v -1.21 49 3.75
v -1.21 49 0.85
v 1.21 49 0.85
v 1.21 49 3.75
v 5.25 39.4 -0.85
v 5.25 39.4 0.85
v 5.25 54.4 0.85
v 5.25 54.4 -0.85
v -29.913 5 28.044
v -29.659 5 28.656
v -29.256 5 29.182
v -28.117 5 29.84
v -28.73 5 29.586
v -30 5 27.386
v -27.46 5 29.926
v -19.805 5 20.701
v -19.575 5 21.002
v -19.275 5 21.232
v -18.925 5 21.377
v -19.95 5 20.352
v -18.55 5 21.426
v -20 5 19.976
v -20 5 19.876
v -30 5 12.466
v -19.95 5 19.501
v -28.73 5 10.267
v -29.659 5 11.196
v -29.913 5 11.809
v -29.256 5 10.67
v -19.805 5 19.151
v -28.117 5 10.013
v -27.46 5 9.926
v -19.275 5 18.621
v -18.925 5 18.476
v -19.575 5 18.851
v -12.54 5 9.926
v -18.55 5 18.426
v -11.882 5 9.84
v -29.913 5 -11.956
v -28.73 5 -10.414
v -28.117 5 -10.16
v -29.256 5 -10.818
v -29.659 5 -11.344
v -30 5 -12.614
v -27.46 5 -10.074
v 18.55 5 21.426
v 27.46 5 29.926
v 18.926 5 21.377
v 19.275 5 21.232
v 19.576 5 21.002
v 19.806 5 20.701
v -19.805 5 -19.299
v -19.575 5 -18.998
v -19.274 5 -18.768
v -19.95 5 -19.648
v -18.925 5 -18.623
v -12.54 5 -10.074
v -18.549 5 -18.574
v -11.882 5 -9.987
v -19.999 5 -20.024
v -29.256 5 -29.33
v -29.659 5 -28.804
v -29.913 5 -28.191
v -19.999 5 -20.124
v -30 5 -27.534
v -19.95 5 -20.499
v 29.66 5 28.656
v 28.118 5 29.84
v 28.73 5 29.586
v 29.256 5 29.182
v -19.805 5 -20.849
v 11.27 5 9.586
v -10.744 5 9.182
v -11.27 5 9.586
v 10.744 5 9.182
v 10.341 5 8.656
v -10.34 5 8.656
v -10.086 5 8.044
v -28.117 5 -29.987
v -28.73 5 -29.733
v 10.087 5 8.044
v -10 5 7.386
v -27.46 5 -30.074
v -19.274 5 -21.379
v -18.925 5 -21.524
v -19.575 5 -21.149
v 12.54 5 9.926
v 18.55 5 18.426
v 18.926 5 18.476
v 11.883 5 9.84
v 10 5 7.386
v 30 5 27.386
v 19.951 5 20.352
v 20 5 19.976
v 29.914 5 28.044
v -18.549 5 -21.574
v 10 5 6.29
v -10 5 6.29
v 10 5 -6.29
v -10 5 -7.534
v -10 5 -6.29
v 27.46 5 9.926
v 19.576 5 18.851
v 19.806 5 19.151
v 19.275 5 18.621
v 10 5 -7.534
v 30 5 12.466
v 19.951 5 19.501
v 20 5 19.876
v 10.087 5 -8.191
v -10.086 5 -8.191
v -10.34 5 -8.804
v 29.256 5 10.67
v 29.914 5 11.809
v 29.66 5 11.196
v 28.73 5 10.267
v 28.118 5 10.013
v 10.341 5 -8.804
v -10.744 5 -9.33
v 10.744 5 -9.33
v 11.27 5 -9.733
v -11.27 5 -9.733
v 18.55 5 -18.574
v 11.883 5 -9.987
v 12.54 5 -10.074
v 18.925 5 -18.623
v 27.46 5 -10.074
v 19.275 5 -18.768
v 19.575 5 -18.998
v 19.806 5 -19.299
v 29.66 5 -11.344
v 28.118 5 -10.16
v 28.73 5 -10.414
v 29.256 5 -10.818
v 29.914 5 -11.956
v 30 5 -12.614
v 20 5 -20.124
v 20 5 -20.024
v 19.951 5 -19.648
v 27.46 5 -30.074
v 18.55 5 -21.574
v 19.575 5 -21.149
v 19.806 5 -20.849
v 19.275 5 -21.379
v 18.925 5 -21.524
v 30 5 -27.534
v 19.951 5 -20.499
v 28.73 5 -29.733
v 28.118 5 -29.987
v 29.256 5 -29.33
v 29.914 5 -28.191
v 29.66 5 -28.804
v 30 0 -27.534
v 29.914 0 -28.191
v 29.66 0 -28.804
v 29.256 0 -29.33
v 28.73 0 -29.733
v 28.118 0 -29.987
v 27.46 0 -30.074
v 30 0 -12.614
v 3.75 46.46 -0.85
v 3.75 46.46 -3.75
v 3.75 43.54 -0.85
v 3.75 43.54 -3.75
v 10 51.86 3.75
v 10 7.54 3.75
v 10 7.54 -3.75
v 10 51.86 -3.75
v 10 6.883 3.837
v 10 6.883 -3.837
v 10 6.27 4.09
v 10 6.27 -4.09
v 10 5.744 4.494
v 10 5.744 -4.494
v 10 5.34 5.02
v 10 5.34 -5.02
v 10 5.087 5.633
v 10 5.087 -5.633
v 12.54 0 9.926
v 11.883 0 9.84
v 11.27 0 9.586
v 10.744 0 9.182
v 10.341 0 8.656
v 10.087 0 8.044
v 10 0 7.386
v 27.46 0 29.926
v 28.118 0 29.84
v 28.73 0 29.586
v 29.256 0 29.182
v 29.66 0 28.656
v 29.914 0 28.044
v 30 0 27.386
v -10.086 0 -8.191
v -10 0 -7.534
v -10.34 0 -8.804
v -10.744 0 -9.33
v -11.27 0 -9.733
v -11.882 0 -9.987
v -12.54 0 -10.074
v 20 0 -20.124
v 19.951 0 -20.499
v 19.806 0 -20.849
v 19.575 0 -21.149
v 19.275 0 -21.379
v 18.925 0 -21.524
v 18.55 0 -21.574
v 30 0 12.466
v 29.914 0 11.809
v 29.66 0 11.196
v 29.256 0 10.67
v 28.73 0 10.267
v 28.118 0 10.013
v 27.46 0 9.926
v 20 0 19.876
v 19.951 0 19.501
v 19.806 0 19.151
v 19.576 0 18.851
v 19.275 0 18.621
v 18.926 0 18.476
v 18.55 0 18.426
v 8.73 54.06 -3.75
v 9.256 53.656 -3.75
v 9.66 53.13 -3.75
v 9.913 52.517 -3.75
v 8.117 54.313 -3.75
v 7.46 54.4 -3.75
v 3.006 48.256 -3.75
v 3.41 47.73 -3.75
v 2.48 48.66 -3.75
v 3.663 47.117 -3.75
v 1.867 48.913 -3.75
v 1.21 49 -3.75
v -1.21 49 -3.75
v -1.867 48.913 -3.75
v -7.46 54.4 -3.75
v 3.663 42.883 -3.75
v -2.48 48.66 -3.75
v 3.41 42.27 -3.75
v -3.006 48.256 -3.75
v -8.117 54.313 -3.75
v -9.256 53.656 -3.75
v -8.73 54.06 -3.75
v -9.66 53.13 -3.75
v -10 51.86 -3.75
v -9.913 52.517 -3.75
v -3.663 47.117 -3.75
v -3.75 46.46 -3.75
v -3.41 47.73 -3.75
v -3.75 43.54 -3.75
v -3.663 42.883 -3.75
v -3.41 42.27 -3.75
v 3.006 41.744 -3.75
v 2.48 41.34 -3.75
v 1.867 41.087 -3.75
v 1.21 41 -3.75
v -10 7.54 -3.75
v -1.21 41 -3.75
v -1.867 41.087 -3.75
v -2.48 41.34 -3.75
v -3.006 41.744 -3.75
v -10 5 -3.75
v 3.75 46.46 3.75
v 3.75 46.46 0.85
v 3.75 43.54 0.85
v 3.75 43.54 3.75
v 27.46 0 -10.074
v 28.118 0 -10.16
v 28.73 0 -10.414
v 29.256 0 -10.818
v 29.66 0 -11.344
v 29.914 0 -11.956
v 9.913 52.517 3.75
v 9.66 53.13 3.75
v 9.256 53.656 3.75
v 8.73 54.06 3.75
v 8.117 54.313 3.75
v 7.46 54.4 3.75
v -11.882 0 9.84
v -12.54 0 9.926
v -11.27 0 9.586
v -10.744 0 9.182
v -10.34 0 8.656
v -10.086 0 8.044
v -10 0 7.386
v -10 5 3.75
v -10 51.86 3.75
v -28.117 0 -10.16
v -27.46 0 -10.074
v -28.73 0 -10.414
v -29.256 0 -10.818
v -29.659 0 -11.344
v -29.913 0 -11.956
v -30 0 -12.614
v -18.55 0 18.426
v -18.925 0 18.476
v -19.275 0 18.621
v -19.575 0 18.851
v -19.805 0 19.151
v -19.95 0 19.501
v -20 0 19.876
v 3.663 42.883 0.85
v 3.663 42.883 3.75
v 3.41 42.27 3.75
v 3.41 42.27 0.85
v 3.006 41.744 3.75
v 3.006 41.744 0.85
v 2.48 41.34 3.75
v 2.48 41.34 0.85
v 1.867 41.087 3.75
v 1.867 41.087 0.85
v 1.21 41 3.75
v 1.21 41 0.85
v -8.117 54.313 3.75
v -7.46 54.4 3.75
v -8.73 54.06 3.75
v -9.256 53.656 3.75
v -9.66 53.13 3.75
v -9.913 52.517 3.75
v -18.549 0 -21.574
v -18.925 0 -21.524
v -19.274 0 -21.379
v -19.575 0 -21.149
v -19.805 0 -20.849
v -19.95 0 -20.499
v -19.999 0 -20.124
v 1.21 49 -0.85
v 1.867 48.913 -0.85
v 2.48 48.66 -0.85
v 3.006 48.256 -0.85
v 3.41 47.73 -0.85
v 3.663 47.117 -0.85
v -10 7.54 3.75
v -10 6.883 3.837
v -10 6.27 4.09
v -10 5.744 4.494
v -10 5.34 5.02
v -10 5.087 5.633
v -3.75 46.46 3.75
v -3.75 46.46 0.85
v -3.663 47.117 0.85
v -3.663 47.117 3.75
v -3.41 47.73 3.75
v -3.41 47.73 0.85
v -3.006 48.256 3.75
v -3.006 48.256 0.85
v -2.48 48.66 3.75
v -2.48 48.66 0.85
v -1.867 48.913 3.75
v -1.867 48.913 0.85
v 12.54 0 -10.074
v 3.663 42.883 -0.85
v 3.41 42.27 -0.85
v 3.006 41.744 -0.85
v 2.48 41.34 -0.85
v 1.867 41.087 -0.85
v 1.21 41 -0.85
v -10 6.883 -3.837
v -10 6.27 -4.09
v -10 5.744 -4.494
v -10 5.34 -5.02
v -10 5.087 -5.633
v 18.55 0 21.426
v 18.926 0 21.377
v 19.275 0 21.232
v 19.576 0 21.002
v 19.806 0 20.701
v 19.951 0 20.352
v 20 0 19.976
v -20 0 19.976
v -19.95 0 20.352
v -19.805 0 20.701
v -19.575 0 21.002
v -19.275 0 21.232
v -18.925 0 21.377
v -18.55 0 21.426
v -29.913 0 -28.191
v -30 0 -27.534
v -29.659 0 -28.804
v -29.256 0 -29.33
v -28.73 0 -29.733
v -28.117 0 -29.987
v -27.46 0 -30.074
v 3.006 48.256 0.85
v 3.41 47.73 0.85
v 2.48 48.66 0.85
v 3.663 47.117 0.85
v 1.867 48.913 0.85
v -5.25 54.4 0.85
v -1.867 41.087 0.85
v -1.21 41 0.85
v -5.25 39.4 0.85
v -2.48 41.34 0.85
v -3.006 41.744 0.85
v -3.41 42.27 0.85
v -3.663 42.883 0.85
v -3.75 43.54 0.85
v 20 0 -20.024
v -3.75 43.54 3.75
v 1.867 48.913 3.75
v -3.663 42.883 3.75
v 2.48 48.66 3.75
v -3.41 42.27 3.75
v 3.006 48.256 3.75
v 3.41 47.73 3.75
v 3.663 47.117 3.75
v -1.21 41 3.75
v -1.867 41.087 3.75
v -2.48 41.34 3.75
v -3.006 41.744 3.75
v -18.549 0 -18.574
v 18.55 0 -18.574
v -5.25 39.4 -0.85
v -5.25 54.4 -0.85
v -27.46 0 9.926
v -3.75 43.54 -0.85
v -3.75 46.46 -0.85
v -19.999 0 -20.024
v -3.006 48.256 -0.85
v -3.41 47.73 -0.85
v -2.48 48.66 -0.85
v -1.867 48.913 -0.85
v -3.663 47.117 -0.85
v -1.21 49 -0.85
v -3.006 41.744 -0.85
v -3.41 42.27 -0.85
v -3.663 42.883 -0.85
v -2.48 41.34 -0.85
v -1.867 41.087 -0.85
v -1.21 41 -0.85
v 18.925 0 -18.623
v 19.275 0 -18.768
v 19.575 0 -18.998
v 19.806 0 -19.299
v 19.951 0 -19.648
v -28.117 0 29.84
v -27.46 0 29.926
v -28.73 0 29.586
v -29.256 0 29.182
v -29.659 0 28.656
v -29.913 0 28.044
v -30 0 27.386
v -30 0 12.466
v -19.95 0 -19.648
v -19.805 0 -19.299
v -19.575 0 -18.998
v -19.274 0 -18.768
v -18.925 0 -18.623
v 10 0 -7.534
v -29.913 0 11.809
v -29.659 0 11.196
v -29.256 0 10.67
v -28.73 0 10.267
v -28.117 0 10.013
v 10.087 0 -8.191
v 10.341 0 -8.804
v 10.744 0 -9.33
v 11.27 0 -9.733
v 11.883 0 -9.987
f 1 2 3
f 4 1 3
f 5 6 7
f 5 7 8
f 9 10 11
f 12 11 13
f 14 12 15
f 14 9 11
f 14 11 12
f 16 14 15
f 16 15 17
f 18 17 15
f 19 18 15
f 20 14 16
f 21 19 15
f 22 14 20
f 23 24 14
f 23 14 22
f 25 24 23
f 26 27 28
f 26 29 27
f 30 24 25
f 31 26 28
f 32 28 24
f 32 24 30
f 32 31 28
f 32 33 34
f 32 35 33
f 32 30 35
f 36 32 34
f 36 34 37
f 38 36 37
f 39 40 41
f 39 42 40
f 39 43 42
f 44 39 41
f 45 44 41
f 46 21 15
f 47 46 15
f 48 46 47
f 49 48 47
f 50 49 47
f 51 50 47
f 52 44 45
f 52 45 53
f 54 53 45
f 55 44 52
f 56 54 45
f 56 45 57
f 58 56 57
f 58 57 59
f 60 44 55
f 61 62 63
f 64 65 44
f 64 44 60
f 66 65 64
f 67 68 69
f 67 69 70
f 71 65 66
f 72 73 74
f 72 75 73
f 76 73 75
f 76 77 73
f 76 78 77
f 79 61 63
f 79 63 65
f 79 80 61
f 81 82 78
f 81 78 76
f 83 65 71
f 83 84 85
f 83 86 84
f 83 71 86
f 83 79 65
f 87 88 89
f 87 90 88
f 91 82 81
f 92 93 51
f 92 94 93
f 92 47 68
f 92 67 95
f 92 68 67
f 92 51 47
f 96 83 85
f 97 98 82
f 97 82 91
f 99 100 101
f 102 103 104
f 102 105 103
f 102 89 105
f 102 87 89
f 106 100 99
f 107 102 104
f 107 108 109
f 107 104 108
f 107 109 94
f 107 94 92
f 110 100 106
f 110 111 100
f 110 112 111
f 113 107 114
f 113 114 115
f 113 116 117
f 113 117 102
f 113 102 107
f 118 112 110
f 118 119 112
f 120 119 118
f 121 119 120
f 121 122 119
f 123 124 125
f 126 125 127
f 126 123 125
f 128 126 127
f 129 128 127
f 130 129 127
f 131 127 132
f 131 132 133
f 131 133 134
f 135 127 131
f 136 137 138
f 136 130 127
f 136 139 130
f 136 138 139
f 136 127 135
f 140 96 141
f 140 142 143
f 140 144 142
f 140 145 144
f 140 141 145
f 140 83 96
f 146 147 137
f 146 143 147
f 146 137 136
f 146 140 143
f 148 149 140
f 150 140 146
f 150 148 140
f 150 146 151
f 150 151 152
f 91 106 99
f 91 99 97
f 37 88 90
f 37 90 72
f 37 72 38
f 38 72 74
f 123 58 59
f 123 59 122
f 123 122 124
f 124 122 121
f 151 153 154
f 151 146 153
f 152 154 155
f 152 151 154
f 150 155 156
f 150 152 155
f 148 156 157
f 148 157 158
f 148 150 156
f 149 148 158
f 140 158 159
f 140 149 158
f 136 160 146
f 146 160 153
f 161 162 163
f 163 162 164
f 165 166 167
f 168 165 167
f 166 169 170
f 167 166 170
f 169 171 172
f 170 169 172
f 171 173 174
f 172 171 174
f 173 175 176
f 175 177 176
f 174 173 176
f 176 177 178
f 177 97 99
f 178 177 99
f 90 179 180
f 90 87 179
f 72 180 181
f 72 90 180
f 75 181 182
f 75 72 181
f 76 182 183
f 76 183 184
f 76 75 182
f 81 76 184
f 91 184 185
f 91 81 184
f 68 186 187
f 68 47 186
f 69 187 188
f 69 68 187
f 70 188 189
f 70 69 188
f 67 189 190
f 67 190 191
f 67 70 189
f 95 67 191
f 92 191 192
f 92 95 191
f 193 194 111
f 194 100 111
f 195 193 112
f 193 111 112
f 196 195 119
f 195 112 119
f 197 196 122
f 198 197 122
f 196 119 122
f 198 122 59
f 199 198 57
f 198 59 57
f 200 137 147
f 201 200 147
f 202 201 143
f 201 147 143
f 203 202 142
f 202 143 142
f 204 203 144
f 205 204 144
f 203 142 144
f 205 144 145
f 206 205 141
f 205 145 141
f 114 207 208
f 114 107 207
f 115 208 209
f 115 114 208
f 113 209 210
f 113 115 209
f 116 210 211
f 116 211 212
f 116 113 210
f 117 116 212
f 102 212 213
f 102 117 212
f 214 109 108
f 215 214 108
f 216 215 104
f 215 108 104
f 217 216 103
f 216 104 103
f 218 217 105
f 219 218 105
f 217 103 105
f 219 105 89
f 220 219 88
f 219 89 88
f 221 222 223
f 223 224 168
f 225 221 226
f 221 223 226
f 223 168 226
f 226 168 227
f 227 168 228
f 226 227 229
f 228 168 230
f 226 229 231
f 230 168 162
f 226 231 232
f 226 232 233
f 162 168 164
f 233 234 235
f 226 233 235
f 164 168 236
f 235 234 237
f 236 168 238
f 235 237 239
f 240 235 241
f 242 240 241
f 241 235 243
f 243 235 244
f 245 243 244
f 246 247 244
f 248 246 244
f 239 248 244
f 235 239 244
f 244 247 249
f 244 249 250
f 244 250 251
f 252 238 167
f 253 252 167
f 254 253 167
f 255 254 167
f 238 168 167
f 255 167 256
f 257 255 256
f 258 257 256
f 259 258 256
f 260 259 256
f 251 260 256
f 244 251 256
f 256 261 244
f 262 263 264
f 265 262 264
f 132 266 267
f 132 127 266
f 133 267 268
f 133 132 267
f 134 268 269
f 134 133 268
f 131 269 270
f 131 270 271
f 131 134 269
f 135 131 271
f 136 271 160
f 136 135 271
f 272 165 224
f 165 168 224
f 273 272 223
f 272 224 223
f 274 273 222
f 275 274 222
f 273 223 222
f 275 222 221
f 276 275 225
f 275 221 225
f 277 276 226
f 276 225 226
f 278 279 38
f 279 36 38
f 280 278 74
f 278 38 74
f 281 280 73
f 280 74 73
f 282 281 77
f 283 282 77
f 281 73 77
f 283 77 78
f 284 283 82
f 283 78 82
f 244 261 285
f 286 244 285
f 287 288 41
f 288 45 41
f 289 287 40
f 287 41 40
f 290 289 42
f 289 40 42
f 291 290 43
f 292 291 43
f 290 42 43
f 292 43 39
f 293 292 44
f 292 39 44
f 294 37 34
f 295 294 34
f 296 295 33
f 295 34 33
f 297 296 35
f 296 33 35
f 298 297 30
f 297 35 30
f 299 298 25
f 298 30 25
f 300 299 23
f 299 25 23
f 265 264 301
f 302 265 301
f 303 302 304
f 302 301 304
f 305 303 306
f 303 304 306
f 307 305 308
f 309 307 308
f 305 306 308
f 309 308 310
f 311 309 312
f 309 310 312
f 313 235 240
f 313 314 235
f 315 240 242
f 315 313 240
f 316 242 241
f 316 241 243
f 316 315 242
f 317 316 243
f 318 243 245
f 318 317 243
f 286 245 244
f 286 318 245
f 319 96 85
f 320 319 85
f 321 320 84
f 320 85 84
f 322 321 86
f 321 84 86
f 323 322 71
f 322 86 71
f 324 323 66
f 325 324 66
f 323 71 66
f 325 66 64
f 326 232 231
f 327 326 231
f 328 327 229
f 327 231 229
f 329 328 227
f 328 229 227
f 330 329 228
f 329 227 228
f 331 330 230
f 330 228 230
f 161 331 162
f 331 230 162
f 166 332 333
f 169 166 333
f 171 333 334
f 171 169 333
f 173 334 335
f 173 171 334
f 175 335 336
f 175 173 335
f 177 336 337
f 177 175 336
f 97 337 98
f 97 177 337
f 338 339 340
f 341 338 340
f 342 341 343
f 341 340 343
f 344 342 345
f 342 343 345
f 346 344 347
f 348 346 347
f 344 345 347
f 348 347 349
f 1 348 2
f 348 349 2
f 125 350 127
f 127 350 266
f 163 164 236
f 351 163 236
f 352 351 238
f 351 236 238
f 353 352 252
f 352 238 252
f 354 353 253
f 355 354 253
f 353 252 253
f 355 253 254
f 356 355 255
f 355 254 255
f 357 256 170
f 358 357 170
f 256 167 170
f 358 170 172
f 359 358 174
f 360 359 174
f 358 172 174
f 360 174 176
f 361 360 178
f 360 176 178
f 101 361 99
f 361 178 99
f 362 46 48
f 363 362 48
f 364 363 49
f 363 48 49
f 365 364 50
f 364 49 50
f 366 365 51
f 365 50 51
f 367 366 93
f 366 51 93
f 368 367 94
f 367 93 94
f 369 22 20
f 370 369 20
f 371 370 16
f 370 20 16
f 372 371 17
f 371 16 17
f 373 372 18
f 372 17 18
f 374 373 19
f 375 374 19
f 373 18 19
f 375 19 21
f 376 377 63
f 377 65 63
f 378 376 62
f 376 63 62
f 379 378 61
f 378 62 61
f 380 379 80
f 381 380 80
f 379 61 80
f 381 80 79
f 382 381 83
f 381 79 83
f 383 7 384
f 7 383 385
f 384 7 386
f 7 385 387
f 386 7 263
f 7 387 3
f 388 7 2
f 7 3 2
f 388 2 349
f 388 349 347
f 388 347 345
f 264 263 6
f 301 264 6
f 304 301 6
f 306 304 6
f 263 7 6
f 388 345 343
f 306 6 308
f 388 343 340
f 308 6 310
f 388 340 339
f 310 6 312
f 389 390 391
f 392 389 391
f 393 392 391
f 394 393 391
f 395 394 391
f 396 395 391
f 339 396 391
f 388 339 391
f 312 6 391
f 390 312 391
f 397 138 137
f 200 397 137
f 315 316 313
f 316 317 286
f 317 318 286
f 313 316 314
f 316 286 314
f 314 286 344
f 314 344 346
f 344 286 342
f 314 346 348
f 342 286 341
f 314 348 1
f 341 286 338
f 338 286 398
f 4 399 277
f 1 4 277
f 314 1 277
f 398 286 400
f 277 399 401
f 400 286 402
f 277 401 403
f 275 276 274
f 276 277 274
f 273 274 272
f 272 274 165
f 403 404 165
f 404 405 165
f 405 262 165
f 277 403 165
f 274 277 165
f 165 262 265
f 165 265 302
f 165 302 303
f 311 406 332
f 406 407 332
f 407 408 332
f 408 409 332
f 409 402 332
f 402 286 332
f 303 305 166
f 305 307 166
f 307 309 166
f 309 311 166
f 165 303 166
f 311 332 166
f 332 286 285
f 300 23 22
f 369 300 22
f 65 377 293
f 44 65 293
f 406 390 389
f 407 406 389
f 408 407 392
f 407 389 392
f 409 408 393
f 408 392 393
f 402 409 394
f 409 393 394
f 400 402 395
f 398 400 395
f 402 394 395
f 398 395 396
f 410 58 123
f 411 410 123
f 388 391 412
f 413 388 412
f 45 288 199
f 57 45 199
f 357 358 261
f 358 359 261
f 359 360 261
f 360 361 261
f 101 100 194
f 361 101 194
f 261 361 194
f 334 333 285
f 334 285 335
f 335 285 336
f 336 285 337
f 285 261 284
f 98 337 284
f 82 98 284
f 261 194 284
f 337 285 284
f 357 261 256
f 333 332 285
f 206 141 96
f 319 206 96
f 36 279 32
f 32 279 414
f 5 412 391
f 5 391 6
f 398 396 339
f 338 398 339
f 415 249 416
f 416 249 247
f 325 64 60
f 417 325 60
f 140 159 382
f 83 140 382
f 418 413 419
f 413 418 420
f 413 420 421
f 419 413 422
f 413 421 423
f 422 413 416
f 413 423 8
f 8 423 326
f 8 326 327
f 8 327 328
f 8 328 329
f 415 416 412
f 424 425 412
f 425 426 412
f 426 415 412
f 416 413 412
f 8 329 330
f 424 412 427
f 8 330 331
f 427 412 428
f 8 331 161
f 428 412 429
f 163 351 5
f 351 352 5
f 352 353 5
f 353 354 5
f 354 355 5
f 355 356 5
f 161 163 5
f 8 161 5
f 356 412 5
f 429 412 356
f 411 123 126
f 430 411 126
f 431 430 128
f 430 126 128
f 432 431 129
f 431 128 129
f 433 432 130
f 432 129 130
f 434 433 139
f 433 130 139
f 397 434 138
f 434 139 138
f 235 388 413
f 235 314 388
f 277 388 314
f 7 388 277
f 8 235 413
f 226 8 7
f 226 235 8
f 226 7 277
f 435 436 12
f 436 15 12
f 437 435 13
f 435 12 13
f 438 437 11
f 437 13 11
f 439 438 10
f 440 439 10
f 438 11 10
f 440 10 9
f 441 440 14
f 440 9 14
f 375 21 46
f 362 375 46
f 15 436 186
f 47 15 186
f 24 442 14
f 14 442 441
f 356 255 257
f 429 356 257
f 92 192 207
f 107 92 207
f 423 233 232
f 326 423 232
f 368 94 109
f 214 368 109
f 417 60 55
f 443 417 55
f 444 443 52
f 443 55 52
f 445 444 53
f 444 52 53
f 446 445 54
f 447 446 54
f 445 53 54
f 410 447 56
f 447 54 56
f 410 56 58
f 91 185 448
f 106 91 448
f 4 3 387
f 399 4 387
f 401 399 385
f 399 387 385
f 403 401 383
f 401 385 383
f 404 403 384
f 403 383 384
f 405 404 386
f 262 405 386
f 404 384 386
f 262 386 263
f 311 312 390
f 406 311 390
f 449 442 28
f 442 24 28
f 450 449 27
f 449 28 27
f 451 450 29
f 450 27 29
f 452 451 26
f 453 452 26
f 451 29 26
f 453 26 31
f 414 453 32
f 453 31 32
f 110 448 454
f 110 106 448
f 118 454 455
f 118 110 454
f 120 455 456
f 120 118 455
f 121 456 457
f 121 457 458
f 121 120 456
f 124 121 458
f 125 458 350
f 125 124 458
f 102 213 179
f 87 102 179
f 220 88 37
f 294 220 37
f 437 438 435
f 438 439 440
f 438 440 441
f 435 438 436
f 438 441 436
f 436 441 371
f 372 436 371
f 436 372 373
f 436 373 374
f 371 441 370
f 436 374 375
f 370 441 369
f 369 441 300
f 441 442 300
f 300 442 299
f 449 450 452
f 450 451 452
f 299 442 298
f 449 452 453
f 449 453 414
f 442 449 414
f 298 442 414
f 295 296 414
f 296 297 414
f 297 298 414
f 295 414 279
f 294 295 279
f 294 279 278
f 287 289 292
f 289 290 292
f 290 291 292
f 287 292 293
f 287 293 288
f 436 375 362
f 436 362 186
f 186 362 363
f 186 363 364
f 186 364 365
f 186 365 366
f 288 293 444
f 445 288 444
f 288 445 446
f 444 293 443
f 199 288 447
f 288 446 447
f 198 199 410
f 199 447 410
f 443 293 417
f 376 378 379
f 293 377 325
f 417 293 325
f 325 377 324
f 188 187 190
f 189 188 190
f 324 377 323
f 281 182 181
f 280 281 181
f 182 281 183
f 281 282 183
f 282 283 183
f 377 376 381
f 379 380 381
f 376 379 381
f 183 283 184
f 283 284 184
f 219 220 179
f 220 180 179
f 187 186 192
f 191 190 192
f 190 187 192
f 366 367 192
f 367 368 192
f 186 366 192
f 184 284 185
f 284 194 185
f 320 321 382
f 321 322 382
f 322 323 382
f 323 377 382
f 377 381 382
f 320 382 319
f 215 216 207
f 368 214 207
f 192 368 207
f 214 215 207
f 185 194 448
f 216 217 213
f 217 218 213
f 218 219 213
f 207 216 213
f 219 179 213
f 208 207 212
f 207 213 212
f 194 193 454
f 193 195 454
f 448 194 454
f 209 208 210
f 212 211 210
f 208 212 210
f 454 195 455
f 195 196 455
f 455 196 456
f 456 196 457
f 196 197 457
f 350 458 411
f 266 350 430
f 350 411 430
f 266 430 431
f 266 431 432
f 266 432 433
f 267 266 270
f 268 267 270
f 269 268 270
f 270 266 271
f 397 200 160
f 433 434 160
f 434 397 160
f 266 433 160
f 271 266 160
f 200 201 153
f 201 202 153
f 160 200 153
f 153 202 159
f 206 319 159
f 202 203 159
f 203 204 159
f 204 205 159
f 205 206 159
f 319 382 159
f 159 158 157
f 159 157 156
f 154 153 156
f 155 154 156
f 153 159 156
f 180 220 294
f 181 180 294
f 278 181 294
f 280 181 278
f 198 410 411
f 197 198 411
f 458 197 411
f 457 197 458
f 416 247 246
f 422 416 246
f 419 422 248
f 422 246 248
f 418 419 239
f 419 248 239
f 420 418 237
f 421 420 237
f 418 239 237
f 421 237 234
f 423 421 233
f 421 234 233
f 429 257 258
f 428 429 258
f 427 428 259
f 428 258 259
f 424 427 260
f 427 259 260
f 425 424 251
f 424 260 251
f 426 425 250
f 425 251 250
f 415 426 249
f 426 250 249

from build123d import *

# Parameters (mm, degrees)
BOSS_EXTRUDE1_DEPTH = 5
CUT_EXTRUDE1_DEPTH  = 43.772012023
FILLET1_R           = 2.54
SKETCH3_W           = 20
SKETCH3_H           = 7.5
BOSS_EXTRUDE2_DEPTH = 34.4
SKETCH4_W           = 4.75
SKETCH4_H           = 1.7
BOSS_EXTRUDE3_DEPTH = 15
CUT_EXTRUDE2_DEPTH  = 71.664569081
FILLET2_R           = 2.54


with BuildPart() as part:
    # Sketch1 → Boss-Extrude1 (new body)
    with BuildSketch(Plane(origin=(0, 0, 0), x_dir=(1, 0, 0), z_dir=(0, 1, 0))):
        Polygon((-29.999623956, -29.926382831), (30.000376044, -29.926382831), (30.000376044, -9.926382831), (10.000376044, -9.926382831), (10.000376044, 10.073617169), (30.000376044, 10.073617169), (30.000376044, 30.073617169), (-29.999623956, 30.073617169), (-29.999623956, 10.073617169), (-9.999623956, 10.073617169), (-9.999623956, -9.926382831), (-29.999623956, -9.926382831), align=None)
    extrude(amount=BOSS_EXTRUDE1_DEPTH)

    # Sketch2 → Cut-Extrude1 (cut, through all)
    with BuildSketch(Plane(origin=(0, 5, 0), x_dir=(1, 0, 0), z_dir=(0, 1, 0))):
        with BuildLine():
            Line((-18.549247911, 18.573617169), (18.55, 18.573617169))
            ThreePointArc((18.55, 18.573617169), (19.575304833, 18.998312337), (20, 20.023617169))
            Line((20, 20.023617169), (20, 20.123617169))
            ThreePointArc((20, 20.123617169), (19.575304833, 21.148922002), (18.55, 21.573617169))
            Line((18.55, 21.573617169), (-18.549247911, 21.573617169))
            ThreePointArc((-18.549247911, 21.573617169), (-19.574552744, 21.148922002), (-19.999247911, 20.123617169))
            Line((-19.999247911, 20.123617169), (-19.999247911, 20.023617169))
            ThreePointArc((-19.999247911, 20.023617169), (-19.574552744, 18.998312337), (-18.549247911, 18.573617169))
        make_face()
        with BuildLine():
            Line((-18.549623956, -21.426382831), (18.550376044, -21.426382831))
            ThreePointArc((18.550376044, -21.426382831), (19.575680877, -21.001687663), (20.000376044, -19.976382831))
            Line((20.000376044, -19.976382831), (20.000376044, -19.876382831))
            ThreePointArc((20.000376044, -19.876382831), (19.575680877, -18.851077998), (18.550376044, -18.426382831))
            Line((18.550376044, -18.426382831), (-18.549623956, -18.426382831))
            ThreePointArc((-18.549623956, -18.426382831), (-19.574928788, -18.851077998), (-19.999623956, -19.876382831))
            Line((-19.999623956, -19.876382831), (-19.999623956, -19.976382831))
            ThreePointArc((-19.999623956, -19.976382831), (-19.574928788, -21.001687663), (-18.549623956, -21.426382831))
        make_face()
    extrude(amount=-CUT_EXTRUDE1_DEPTH, mode=Mode.SUBTRACT)

    # Fillet1
    fillet1_edges = [part.edges().sort_by_distance(p)[0] for p in [
        (-29.999623956, 2.5, -10.073617169),
        (-29.999623956, 2.5, -30.073617169),
        (30.000376044, 2.5, -30.073617169),
        (30.000376044, 2.5, -10.073617169),
        (10.000376044, 2.5, -10.073617169),
        (10.000376044, 2.5, 9.926382831),
        (30.000376044, 2.5, 9.926382831),
        (30.000376044, 2.5, 29.926382831),
        (-29.999623956, 2.5, 29.926382831),
        (-29.999623956, 2.5, 9.926382831),
        (-9.999623956, 2.5, 9.926382831),
        (-9.999623956, 2.5, -10.073617169),
    ]]
    fillet(fillet1_edges, radius=FILLET1_R)

    # Sketch3 → Boss-Extrude2 (add)
    with BuildSketch(Plane(origin=(0, 5, 0), x_dir=(1, 0, 0), z_dir=(0, 1, 0))):
        Rectangle(SKETCH3_W, SKETCH3_H)
    extrude(amount=BOSS_EXTRUDE2_DEPTH)

    # Sketch4 → Boss-Extrude3 (add)
    with BuildSketch(Plane(origin=(0, 39.4, 0), x_dir=(1, 0, 0), z_dir=(0, 1, 0))):
        Polygon((10, -3.75), (10, -0.85), (5.25, -0.85), (-5.25, -0.85), (-10, -0.85), (-10, -3.75), align=None)
        with Locations((7.625, 0)):
            Rectangle(SKETCH4_W, SKETCH4_H)
        Polygon((5.25, 0.85), (10, 0.85), (10, 3.75), (-10, 3.75), (-10, 0.85), (-5.25, 0.85), align=None)
        with Locations((-7.625, 0)):
            Rectangle(SKETCH4_W, SKETCH4_H)
    extrude(amount=BOSS_EXTRUDE3_DEPTH)

    # Sketch5 → Cut-Extrude2 (cut, through all)
    with BuildSketch(Plane(origin=(0, 0, -3.75), x_dir=(-1, 0, 0), z_dir=(0, 0, -1))):
        with BuildLine():
            Line((-1.21, 41), (1.21, 41))
            ThreePointArc((1.21, 41), (3.006051224, 41.743948776), (3.75, 43.54))
            Line((3.75, 43.54), (3.75, 46.46))
            ThreePointArc((3.75, 46.46), (3.006051224, 48.256051224), (1.21, 49))
            Line((1.21, 49), (-1.21, 49))
            ThreePointArc((-1.21, 49), (-3.006051224, 48.256051224), (-3.75, 46.46))
            Line((-3.75, 46.46), (-3.75, 43.54))
            ThreePointArc((-3.75, 43.54), (-3.006051224, 41.743948776), (-1.21, 41))
        make_face()
    extrude(amount=-CUT_EXTRUDE2_DEPTH, mode=Mode.SUBTRACT)

    # Fillet2
    fillet2_edges = [part.edges().sort_by_distance(p)[0] for p in [
        (0.000188022, 5, 3.75),
        (0.000188022, 5, -3.75),
        (-10, 54.4, 0),
        (10, 54.4, 0),
    ]]
    fillet(fillet2_edges, radius=FILLET2_R)


solid = part.part
